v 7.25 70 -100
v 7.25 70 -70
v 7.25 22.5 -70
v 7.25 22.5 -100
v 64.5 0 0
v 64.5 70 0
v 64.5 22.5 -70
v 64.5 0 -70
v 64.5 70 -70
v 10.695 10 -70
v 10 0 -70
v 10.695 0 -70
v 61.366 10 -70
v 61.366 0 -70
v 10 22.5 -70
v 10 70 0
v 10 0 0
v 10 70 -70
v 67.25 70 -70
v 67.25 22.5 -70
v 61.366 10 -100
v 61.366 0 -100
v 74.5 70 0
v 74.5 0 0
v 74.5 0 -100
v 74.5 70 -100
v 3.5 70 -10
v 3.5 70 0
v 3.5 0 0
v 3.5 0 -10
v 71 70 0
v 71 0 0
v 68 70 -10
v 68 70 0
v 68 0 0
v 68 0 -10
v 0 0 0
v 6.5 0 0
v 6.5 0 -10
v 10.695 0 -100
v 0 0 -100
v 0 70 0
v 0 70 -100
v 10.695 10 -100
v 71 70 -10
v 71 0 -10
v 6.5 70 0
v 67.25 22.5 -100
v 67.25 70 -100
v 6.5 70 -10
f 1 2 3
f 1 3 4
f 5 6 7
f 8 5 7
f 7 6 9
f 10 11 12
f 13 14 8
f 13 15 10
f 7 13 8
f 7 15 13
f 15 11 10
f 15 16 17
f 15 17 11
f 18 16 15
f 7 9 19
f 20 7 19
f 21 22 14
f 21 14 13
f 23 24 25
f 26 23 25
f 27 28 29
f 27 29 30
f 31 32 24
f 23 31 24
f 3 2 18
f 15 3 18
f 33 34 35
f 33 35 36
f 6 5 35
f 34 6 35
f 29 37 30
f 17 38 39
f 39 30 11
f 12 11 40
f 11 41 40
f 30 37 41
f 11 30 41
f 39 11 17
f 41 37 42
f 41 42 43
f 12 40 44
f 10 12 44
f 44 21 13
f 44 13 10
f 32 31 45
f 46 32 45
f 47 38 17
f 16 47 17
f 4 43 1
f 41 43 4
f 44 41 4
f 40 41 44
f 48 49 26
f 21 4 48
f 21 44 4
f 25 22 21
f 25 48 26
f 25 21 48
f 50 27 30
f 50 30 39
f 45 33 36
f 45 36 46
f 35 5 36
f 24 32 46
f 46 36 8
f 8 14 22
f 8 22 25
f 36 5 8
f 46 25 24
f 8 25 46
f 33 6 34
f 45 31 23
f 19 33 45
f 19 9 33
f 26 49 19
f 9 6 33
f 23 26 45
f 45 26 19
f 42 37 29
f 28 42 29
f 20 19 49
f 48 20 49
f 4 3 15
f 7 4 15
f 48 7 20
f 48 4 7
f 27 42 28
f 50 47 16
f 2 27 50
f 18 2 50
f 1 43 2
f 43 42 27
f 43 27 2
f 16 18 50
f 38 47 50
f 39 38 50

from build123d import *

# Parameters (mm, degrees)
SKETCH1_W           = 74.5
SKETCH1_H           = 100
BOSS_EXTRUDE1_DEPTH = 70
SKETCH3_W           = 54.5
SKETCH3_H           = 70
CUT_EXTRUDE1_DEPTH  = 144.004370563
SKETCH5_W           = 60
SKETCH5_H           = 30
CUT_EXTRUDE2_DEPTH  = 47.5
SKETCH6_W           = 3
SKETCH6_H           = 10
CUT_EXTRUDE3_DEPTH  = 144.004370563
SKETCH7_W           = 3
SKETCH7_H           = 10
CUT_EXTRUDE4_DEPTH  = 144.004370563
SKETCH10_W          = 50.670772636
SKETCH10_H          = 10
CUT_EXTRUDE5_DEPTH  = 144.004370563


with BuildPart() as part:
    # Sketch1 → Boss-Extrude1 (new body)
    with BuildSketch(Plane(origin=(0, 0, 0), x_dir=(1, 0, 0), z_dir=(0, 1, 0))):
        with Locations((37.25, 50)):
            Rectangle(SKETCH1_W, SKETCH1_H)
    extrude(amount=BOSS_EXTRUDE1_DEPTH)

    # Sketch3 → Cut-Extrude1 (cut, through all)
    with BuildSketch(Plane(origin=(0, 70, 0), x_dir=(1, 0, 0), z_dir=(0, 1, 0))):
        with Locations((37.25, 35)):
            Rectangle(SKETCH3_W, SKETCH3_H)
    extrude(amount=-CUT_EXTRUDE1_DEPTH, mode=Mode.SUBTRACT)

    # Sketch5 → Cut-Extrude2 (cut)
    with BuildSketch(Plane(origin=(0, 70, 0), x_dir=(1, 0, 0), z_dir=(0, 1, 0))):
        with Locations((37.25, 85)):
            Rectangle(SKETCH5_W, SKETCH5_H)
    extrude(amount=-CUT_EXTRUDE2_DEPTH, mode=Mode.SUBTRACT)

    # Sketch6 → Cut-Extrude3 (cut, through all)
    with BuildSketch(Plane(origin=(0, 70, 0), x_dir=(1, 0, 0), z_dir=(0, 1, 0))):
        with Locations((69.5, 5)):
            Rectangle(SKETCH6_W, SKETCH6_H)
    extrude(amount=-CUT_EXTRUDE3_DEPTH, mode=Mode.SUBTRACT)

    # Sketch7 → Cut-Extrude4 (cut, through all)
    with BuildSketch(Plane(origin=(0, 70, 0), x_dir=(1, 0, 0), z_dir=(0, 1, 0))):
        with Locations((5, 5)):
            Rectangle(SKETCH7_W, SKETCH7_H)
    extrude(amount=-CUT_EXTRUDE4_DEPTH, mode=Mode.SUBTRACT)

    # Sketch10 → Cut-Extrude5 (cut, through all)
    with BuildSketch(Plane(origin=(0, 0, -100), x_dir=(-1, 0, 0), z_dir=(0, 0, -1))):
        with Locations((-36.030583725, 5)):
            Rectangle(SKETCH10_W, SKETCH10_H)
    extrude(amount=-CUT_EXTRUDE5_DEPTH, mode=Mode.SUBTRACT)


solid = part.part
